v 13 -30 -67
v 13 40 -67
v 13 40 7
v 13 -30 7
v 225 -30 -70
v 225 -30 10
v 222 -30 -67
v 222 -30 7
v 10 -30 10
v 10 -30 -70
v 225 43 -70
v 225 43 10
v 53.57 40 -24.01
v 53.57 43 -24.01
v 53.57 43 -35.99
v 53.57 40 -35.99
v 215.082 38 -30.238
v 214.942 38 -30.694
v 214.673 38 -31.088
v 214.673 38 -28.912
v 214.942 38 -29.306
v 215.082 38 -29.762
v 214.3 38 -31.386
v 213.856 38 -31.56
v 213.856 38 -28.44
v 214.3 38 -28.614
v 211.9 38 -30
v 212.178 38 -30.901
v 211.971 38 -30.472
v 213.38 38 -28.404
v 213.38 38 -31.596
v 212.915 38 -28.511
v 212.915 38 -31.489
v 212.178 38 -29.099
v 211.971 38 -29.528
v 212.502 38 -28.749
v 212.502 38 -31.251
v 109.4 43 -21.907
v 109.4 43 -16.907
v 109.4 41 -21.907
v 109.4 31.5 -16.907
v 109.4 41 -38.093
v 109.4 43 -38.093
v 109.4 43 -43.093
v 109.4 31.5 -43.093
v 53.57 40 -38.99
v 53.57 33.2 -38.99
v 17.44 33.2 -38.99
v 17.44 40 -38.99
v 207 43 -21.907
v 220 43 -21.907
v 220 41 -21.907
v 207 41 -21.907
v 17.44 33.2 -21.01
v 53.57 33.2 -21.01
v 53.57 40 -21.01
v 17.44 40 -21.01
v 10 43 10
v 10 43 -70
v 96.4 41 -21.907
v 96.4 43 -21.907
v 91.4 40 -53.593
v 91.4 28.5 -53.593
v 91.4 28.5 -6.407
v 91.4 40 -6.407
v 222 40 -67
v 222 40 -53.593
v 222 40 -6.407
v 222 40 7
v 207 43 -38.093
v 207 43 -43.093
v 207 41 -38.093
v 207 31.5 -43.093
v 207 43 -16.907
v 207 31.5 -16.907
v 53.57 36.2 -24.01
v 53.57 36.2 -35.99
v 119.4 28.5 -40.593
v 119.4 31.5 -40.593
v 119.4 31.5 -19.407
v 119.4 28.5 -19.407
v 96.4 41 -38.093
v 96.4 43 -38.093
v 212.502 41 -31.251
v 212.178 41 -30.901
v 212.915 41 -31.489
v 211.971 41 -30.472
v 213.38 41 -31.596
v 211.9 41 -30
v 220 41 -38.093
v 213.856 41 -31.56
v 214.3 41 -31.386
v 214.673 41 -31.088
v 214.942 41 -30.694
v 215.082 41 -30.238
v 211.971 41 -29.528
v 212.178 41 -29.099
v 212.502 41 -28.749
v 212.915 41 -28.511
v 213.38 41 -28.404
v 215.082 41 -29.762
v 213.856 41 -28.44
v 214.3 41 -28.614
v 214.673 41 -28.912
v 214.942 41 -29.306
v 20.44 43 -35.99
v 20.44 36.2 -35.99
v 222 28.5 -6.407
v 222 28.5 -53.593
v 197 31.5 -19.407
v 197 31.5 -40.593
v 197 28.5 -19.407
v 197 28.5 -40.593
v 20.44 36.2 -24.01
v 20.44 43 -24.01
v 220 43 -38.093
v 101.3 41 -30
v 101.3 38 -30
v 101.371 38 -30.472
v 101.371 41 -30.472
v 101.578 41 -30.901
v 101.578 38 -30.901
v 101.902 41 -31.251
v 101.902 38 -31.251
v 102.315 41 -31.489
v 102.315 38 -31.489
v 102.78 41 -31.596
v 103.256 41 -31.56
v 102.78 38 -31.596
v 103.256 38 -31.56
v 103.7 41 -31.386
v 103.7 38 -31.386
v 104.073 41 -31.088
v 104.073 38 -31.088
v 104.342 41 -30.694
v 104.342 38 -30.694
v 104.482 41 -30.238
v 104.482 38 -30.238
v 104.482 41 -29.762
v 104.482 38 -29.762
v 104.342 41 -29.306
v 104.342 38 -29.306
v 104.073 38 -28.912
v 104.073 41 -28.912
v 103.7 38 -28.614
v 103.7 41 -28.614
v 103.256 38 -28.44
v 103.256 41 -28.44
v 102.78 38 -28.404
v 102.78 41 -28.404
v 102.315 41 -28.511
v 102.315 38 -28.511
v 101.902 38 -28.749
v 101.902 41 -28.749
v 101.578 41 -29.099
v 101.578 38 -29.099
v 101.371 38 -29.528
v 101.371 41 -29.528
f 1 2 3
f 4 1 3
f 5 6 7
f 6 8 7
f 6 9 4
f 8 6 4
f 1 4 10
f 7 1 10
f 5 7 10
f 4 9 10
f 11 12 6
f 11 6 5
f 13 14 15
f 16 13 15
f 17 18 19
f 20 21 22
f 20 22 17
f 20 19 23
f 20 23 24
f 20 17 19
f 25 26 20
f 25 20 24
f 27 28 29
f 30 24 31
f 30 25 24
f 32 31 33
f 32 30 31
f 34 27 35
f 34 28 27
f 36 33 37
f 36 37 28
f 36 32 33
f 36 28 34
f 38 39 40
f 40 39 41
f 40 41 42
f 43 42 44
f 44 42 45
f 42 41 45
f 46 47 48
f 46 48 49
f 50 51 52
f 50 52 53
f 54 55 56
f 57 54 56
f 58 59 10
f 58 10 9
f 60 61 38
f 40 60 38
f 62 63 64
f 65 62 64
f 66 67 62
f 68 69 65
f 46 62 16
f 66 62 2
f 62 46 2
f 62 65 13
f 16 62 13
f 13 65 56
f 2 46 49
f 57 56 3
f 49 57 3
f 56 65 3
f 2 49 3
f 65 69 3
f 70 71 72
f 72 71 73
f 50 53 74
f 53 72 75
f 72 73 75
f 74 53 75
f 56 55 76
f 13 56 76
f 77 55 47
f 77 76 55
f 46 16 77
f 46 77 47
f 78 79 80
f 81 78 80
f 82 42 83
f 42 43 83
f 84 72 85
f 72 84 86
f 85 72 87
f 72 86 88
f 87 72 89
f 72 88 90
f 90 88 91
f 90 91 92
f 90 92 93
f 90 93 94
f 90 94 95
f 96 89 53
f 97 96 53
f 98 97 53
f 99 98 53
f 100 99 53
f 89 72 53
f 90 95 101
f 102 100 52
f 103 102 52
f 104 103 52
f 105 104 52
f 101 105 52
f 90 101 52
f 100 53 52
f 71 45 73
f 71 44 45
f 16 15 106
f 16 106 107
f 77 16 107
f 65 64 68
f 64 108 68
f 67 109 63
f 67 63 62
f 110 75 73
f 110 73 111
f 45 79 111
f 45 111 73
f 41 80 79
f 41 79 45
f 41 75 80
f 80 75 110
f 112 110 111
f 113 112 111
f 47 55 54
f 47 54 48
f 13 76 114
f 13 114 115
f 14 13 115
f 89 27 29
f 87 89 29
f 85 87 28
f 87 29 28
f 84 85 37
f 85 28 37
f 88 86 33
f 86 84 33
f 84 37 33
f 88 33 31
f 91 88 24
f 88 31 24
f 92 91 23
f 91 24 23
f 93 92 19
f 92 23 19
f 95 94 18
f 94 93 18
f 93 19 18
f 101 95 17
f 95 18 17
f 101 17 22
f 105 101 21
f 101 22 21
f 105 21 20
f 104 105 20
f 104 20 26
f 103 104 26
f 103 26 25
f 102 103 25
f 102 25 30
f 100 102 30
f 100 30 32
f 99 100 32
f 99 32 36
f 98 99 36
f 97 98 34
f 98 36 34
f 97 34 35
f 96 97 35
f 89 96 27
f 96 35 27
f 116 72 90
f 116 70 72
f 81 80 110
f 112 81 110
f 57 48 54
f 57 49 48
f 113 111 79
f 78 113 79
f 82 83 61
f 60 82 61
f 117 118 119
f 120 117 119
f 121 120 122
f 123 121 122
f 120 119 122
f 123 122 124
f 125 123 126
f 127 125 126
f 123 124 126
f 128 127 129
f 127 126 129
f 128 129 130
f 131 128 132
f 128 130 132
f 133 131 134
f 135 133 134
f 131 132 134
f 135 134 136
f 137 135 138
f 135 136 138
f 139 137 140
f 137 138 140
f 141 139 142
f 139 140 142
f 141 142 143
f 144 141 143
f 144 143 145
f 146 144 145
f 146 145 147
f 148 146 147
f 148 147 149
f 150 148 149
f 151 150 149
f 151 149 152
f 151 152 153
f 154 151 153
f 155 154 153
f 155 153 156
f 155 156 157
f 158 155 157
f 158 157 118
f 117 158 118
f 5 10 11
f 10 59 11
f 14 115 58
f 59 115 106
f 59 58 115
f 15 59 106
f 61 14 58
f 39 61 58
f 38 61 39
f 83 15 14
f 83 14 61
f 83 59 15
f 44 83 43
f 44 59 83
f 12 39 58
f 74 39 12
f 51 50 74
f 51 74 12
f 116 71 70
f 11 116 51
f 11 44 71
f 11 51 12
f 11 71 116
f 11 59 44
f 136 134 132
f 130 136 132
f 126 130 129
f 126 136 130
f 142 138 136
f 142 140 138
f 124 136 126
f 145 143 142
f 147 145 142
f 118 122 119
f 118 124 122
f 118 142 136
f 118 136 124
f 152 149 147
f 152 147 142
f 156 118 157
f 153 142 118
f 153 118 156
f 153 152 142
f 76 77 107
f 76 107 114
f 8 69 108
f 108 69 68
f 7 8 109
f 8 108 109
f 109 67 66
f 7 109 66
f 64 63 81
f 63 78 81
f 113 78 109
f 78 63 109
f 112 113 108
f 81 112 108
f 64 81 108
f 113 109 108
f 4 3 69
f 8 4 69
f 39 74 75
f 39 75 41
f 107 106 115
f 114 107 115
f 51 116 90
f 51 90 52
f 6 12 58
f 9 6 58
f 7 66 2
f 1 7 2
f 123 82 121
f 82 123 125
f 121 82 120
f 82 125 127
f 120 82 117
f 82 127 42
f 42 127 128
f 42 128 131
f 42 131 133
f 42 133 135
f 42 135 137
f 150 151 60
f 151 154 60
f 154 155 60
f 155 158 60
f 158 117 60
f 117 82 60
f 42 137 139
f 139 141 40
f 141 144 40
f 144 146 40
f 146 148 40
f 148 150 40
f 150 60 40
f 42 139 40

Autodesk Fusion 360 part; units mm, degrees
sketch "Boceto1" plane through (0, 0, 0) normal (0, 1, 0) x (1, 0, 0)
  line L0 (0, 0) -> (220, 0)
  line L1 (220, 0) -> (220, 60)
  line L2 (220, 60) -> (0, 60)
  line L3 (0, 60) -> (0, 0)
  line L4 (227, -7) -> (227, 67)
  line L5 (227, 67) -> (-7, 67)
  line L6 (-7, 67) -> (-7, -7)
  line L7 (-7, -7) -> (227, -7)
  line L8 (217, 3) -> (217, 57)
  line L9 (217, 57) -> (3, 57)
  line L10 (3, 57) -> (3, 3)
  line L11 (3, 3) -> (217, 3)
  dimension "d1" = 220
  dimension "d2" = 60
  dimension "d3" = 7
  dimension "d4" = -3
extrude "Extruir1" add sketch "Boceto1" along normal blind 3 contours L4 L5 L6 L7
sketch "Boceto2" plane through (0, 0, 0) normal (0, 1, 0) x (1, 0, 0)
  line L0 (0, 0) -> (220, 0)
  line L1 (220, 0) -> (220, 60)
  line L2 (220, 60) -> (0, 60)
  line L3 (0, 60) -> (0, 0)
  line L4 (3, 3) -> (217, 3)
  line L5 (217, 3) -> (217, 57)
  line L6 (217, 57) -> (3, 57)
  line L7 (3, 57) -> (3, 3)
  dimension "d7" = -3
extrude "Extruir2" add sketch "Boceto2" along normal blind 40
sketch "Boceto3" plane through (0, 40, 0) normal (0, 1, 0) x (-1, 0, 0)
  line L0 (-3, -3) -> (-3, -57)
  line L1 (-3, -57) -> (-217, -57)
  line L2 (-217, -57) -> (-217, -3)
  line L3 (-217, -3) -> (-3, -3)
  line L4 (0, -60) -> (0, 0)
  line L5 (0, 0) -> (-220, 0)
  line L6 (-220, 0) -> (-220, -60)
  line L7 (-220, -60) -> (0, -60)
  line L8 (0, 0) -> (-220, 0)
  line L9 (-220, 0) -> (-220, -60)
  line L10 (-220, -60) -> (0, -60)
  line L11 (0, -60) -> (0, 0)
  line L12 (0, 0) -> (-220, 0)
  line L13 (-220, 0) -> (-220, -60)
  line L14 (-220, -60) -> (0, -60)
  line L15 (0, -60) -> (0, 0)
extrude "Extruir3" add sketch "Boceto3" along normal blind 3 contours L0 L1 L2 L3 | L4 L5 L6 L7 L8 L9 L10 L11 L12 L13 L14 L15
sketch "Boceto4" plane through (0, 43, 0) normal (0, 1, 0) x (-1, 0, 0)
  line L0 (0, -60) -> (0, 0)
  line L1 (0, 0) -> (-220, 0)
  line L2 (-220, 0) -> (-220, -60)
  line L3 (-220, -60) -> (0, -60)
  line L4 (-25, -35.99) -> (-53.57, -35.99)
  line L5 (-53.57, -35.99) -> (-53.57, -24.01)
  line L6 (-53.57, -24.01) -> (-25, -24.01)
  line L7 (-25, -24.01) -> (-25, -35.99)
  dimension "d15" = 28.57
  dimension "d16" = 11.98
extrude "Extruir4" cut sketch "Boceto4" against normal blind 3 contours L4 L5 L6 L7
sketch "Boceto5" plane through (0, 43, 0) normal (0, 1, 0) x (-1, 0, 0)
  line L0 (-53.57, -35.99) -> (-53.57, -24.01)
  line L1 (-53.57, -24.01) -> (-25, -24.01)
  line L2 (-25, -24.01) -> (-25, -35.99)
  line L3 (-25, -35.99) -> (-53.57, -35.99)
  line L4 (0, -60) -> (0, 0)
  line L5 (0, 0) -> (-220, 0)
  line L6 (-220, 0) -> (-220, -60)
  line L7 (-220, -60) -> (0, -60)
  line L8 (-197, -40.593) -> (-119.4, -40.593)
  line L9 (-119.4, -40.593) -> (-119.4, -19.407)
  line L10 (-119.4, -19.407) -> (-197, -19.407)
  line L11 (-197, -19.407) -> (-197, -40.593)
  point P0 (-220, -30)
  point P1 (-197, -40.593)
  dimension "d22" = 77.6
  dimension "d23" = 21.186
extrude "Extruir5" cut sketch "Boceto5" against normal blind 3 contours L8 L9 L10 L11
sketch "Boceto6" plane through (0, 40, 0) normal (0, -1, 0) x (1, 0, 0)
  line L0 (197, -40.593) -> (119.4, -40.593)
  line L1 (119.4, -40.593) -> (119.4, -19.407)
  line L2 (119.4, -19.407) -> (197, -19.407)
  line L3 (197, -19.407) -> (197, -40.593)
  line L4 (53.57, -24.01) -> (53.57, -35.99)
  line L5 (53.57, -35.99) -> (25, -35.99)
  line L6 (25, -35.99) -> (25, -24.01)
  line L7 (25, -24.01) -> (53.57, -24.01)
  line L8 (217, -3) -> (3, -3)
  line L9 (3, -3) -> (3, -57)
  line L10 (3, -57) -> (217, -57)
  line L11 (217, -57) -> (217, -3)
  line L12 (200, -43.593) -> (116.4, -43.593)
  line L13 (116.4, -43.593) -> (116.4, -16.407)
  line L14 (116.4, -16.407) -> (200, -16.407)
  line L15 (200, -16.407) -> (200, -43.593)
  dimension "d26" = -3
extrude "Extruir6" add sketch "Boceto6" along normal blind 11.5 contours L12 L13 L14 L15
sketch "Boceto7" plane through (0, 43, 0) normal (0, 1, 0) x (-1, 0, 0)
  line L0 (-119.4, -40.593) -> (-197, -40.593)
  line L1 (-197, -40.593) -> (-197, -19.407)
  line L2 (-197, -19.407) -> (-119.4, -19.407)
  line L3 (-119.4, -19.407) -> (-119.4, -40.593)
  line L4 (-53.57, -35.99) -> (-53.57, -24.01)
  line L5 (-53.57, -24.01) -> (-25, -24.01)
  line L6 (-25, -24.01) -> (-25, -35.99)
  line L7 (-25, -35.99) -> (-53.57, -35.99)
  line L8 (0, -60) -> (0, 0)
  line L9 (0, 0) -> (-220, 0)
  line L10 (-220, 0) -> (-220, -60)
  line L11 (-220, -60) -> (0, -60)
  line L12 (0, 0) -> (-220, 0)
  line L13 (-220, 0) -> (-220, -60)
  line L14 (-220, -60) -> (0, -60)
  line L15 (0, -60) -> (0, 0)
  line L16 (-230, -70) -> (10, -70)
  line L17 (10, -70) -> (10, 10)
  line L18 (10, 10) -> (-230, 10)
  line L19 (-230, 10) -> (-230, -70)
  dimension "d29" = 10
extrude "Extruir7" add sketch "Boceto7" against normal blind 43 contours L16 L17 L18 L19
sketch "Boceto8" plane through (0, 43, 0) normal (0, 1, 0) x (-1, 0, 0)
  line L0 (-230, 10) -> (-230, -70)
  line L1 (-230, -70) -> (10, -70)
  line L2 (10, -70) -> (10, 10)
  line L3 (10, 10) -> (-230, 10)
  line L4 (-119.4, -40.593) -> (-197, -40.593)
  line L5 (-197, -40.593) -> (-197, -19.407)
  line L6 (-197, -19.407) -> (-119.4, -19.407)
  line L7 (-119.4, -19.407) -> (-119.4, -40.593)
  line L8 (-53.57, -35.99) -> (-53.57, -24.01)
  line L9 (-53.57, -24.01) -> (-25, -24.01)
  line L10 (-25, -24.01) -> (-25, -35.99)
  line L11 (-25, -35.99) -> (-53.57, -35.99)
sketch "Boceto9" plane through (0, 0, 0) normal (0, -1, 0) x (1, 0, 0)
  line L0 (230, -70) -> (230, 10)
  line L1 (230, 10) -> (-10, 10)
  line L2 (-10, 10) -> (-10, -70)
  line L3 (-10, -70) -> (230, -70)
  line L4 (3, -57) -> (3, -3)
  line L5 (3, -3) -> (217, -3)
  line L6 (217, -3) -> (217, -57)
  line L7 (217, -57) -> (3, -57)
  line L8 (-10, 10) -> (-7, 10)
  line L9 (-7, 10) -> (-7, 7)
  line L10 (-7, 7) -> (-10, 7)
  line L11 (-10, 7) -> (-10, 10)
  line L12 (230, -70) -> (227, -70)
  line L13 (227, -70) -> (227, -67)
  line L14 (227, -67) -> (230, -67)
  line L15 (230, -67) -> (230, -70)
  line L16 (-7, 7) -> (227, 7)
  line L17 (227, 7) -> (227, -67)
  line L18 (227, -67) -> (-7, -67)
  line L19 (-7, -67) -> (-7, 7)
  dimension "d32" = 3
  dimension "d33" = 3
  dimension "d34" = 3
  dimension "d35" = 3
extrude "Extruir8" cut sketch "Boceto9" against normal blind 40 contours L16 L17 L18 L19
sketch "Boceto10" plane through (0, 40, 0) normal (0, -1, 0) x (1, 0, 0)
  line L0 (-7, -67) -> (227, -67)
  line L1 (227, -67) -> (227, 7)
  line L2 (227, 7) -> (-7, 7)
  line L3 (-7, 7) -> (-7, -67)
  line L4 (200, -16.407) -> (200, -43.593)
  line L5 (200, -43.593) -> (116.4, -43.593)
  line L6 (116.4, -43.593) -> (116.4, -16.407)
  line L7 (116.4, -16.407) -> (200, -16.407)
  line L8 (53.57, -24.01) -> (53.57, -35.99)
  line L9 (53.57, -35.99) -> (25, -35.99)
  line L10 (25, -35.99) -> (25, -24.01)
  line L11 (25, -24.01) -> (53.57, -24.01)
  line L12 (56.57, -38.99) -> (22, -38.99)
  line L13 (22, -38.99) -> (22, -21.01)
  line L14 (22, -21.01) -> (56.57, -21.01)
  line L15 (56.57, -21.01) -> (56.57, -38.99)
  dimension "d38" = -3
extrude "Extruir9" add sketch "Boceto10" along normal blind 3.8 contours L12 L13 L14 L15
sketch "Boceto11" plane through (0, 36.2, 0) normal (0, -1, 0) x (1, 0, 0)
  line L0 (25, -35.99) -> (25, -24.01)
  line L1 (25, -24.01) -> (53.57, -24.01)
  line L2 (53.57, -24.01) -> (53.57, -35.99)
  line L3 (53.57, -35.99) -> (25, -35.99)
  line L4 (56.57, -21.01) -> (22, -21.01)
  line L5 (22, -21.01) -> (22, -38.99)
  line L6 (22, -38.99) -> (56.57, -38.99)
  line L7 (56.57, -38.99) -> (56.57, -21.01)
  line L8 (22, -21.01) -> (56.57, -21.01)
  line L9 (56.57, -21.01) -> (56.57, -38.99)
  line L10 (56.57, -38.99) -> (22, -38.99)
  line L11 (22, -38.99) -> (22, -21.01)
extrude "Extruir10" add sketch "Boceto11" along normal blind 3 contours L0 L1 L2 L3 | L4 L5 L6 L7 L8 L9 L10 L11
sketch "Boceto12" plane through (56.57, 0, 0) normal (1, 0, 0) x (0, 0, -1)
  line L0 (38.99, 40) -> (21.01, 40)
  line L1 (21.01, 40) -> (21.01, 33.2)
  line L2 (21.01, 33.2) -> (38.99, 33.2)
  line L3 (38.99, 33.2) -> (38.99, 40)
  line L4 (21.01, 40) -> (24.01, 40)
  line L5 (38.99, 40) -> (35.99, 40)
  line L6 (24.01, 40) -> (35.99, 40)
  line L7 (35.99, 40) -> (35.99, 36.2)
  line L8 (35.99, 36.2) -> (24.01, 36.2)
  line L9 (24.01, 36.2) -> (24.01, 40)
  dimension "d43" = 3
  dimension "d44" = 3
  dimension "d45" = 11.98
  dimension "d46" = 3.8
extrude "Extruir11" cut sketch "Boceto12" against normal blind 3 contours L0 L6 L7 L8 L9
sketch "Boceto13" plane through (56.57, 0, 0) normal (1, 0, 0) x (0, 0, -1)
  line L0 (24.01, 36.2) -> (24.01, 40)
  line L1 (24.01, 40) -> (21.01, 40)
  line L2 (21.01, 40) -> (21.01, 33.2)
  line L3 (21.01, 33.2) -> (38.99, 33.2)
  line L4 (38.99, 33.2) -> (38.99, 40)
  line L5 (38.99, 40) -> (35.99, 40)
  line L6 (35.99, 40) -> (35.99, 36.2)
  line L7 (35.99, 36.2) -> (24.01, 36.2)
  line L8 (21.01, 40) -> (38.99, 40)
  line L9 (38.99, 40) -> (38.99, 33.2)
  line L10 (38.99, 33.2) -> (21.01, 33.2)
  line L11 (21.01, 33.2) -> (21.01, 40)
extrude "Extruir12" cut sketch "Boceto13" against normal blind 3 contours L0 L1 L2 L3 L4 L5 L6 L7 L8 L9 L10 L11
sketch "Boceto14" plane through (25, 0, 0) normal (1, 0, 0) x (0, 0, -1)
  line L0 (35.99, 43) -> (24.01, 43)
  line L1 (24.01, 43) -> (24.01, 36.2)
  line L2 (24.01, 36.2) -> (35.99, 36.2)
  line L3 (35.99, 36.2) -> (35.99, 43)
  line L4 (24.01, 43) -> (35.99, 43)
  line L5 (35.99, 43) -> (35.99, 36.2)
  line L6 (35.99, 36.2) -> (24.01, 36.2)
  line L7 (24.01, 36.2) -> (24.01, 43)
extrude "Extruir13" add sketch "Boceto14" against normal blind 4.56
extrude "Extruir14" add 1 faces at (22, 34.2, -28.0033) along direction (-1, 0, 0) blind 4.56
extrude "Extruir15" cut 1 faces at (25, 40.7333, -31.9967) along direction (-1, 0, 0) blind 4.56
sketch "Boceto15" plane through (17.44, 0, 0) normal (-1, 0, 0) x (0, 0, 1)
  line L0 (-35.99, 36.2) -> (-35.99, 40)
  line L1 (-35.99, 40) -> (-38.99, 40)
  line L2 (-38.99, 40) -> (-38.99, 33.2)
  line L3 (-38.99, 33.2) -> (-21.01, 33.2)
  line L4 (-21.01, 33.2) -> (-21.01, 40)
  line L5 (-21.01, 40) -> (-24.01, 40)
  line L6 (-24.01, 40) -> (-24.01, 36.2)
  line L7 (-24.01, 36.2) -> (-35.99, 36.2)
  line L8 (-38.99, 33.2) -> (-21.01, 33.2)
  line L9 (-21.01, 33.2) -> (-21.01, 40)
  line L10 (-21.01, 40) -> (-38.99, 40)
  line L11 (-38.99, 40) -> (-38.99, 33.2)
extrude "Extruir16" add sketch "Boceto15" against normal blind 3 contours L0 L6 L7 L10
sketch "Boceto16" plane through (0, 0, 0) normal (0, -1, 0) x (1, 0, 0)
  line L0 (227, 7) -> (227, -67)
  line L1 (227, -67) -> (-7, -67)
  line L2 (-7, -67) -> (-7, 7)
  line L3 (-7, 7) -> (227, 7)
  line L4 (230, -70) -> (230, 10)
  line L5 (230, 10) -> (-10, 10)
  line L6 (-10, 10) -> (-10, -70)
  line L7 (-10, -70) -> (230, -70)
  line L8 (230, 10) -> (245, 10)
  line L9 (245, 10) -> (245, -70)
  line L10 (245, -70) -> (230, -70)
  line L11 (230, -70) -> (230, 10)
  line L12 (-10, 10) -> (-25, 10)
  line L13 (-25, 10) -> (-25, -70)
  line L14 (-25, -70) -> (-10, -70)
  line L15 (-10, -70) -> (-10, 10)
  dimension "d59" = 15
  dimension "d60" = 80
  dimension "d61" = 15
  dimension "d62" = 80
extrude "Extruir17" add sketch "Boceto16" against normal blind 3 contours L4 L8 L9 L10 L11 | L6 L12 L13 L14 L15
sketch "Boceto17" plane through (0, 3, 0) normal (0, 1, 0) x (-1, 0, 0)
  line L0 (10, 10) -> (10, -70)
  line L1 (10, -70) -> (25, -70)
  line L2 (25, -70) -> (25, 10)
  line L3 (25, 10) -> (10, 10)
  circle A0 centre (17.5, 1.5623) radius 3.375
  circle A1 centre (16.8728, -62.4918) radius 3.375
  circle A2 centre (-237.4689, -62.1794) radius 3.375
  circle A3 centre (-237.1564, 2.4997) radius 3.375
  dimension "d65" = 6.75
  dimension "d66" = 6.75
  dimension "d67" = 6.75
  dimension "d68" = 6.75
extrude "Extruir18" cut sketch "Boceto17" against normal blind 3 contours A0 | A1 | A2 | A3
sketch "Boceto18" plane through (0, 0, 0) normal (0, -1, 0) x (1, 0, 0)
  line L0 (245, 10) -> (-25, 10)
  line L1 (-25, 10) -> (-25, -70)
  line L2 (-25, -70) -> (245, -70)
  line L3 (245, -70) -> (245, 10)
  line L4 (227, 7) -> (227, -67)
  line L5 (227, -67) -> (-7, -67)
  line L6 (-7, -67) -> (-7, 7)
  line L7 (-7, 7) -> (227, 7)
  circle A0 centre (237.4689, -62.1794) radius 3.375
  circle A1 centre (-16.8728, -62.4918) radius 3.375
  circle A2 centre (237.1564, 2.4997) radius 3.375
  circle A3 centre (-17.5, 1.5623) radius 3.375
  line L8 (-25, 10) -> (245, 10)
  line L9 (245, 10) -> (245, -70)
  line L10 (245, -70) -> (-25, -70)
  line L11 (-25, -70) -> (-25, 10)
extrude "Extruir19" add sketch "Boceto18" along normal blind 30
sketch "Boceto19" plane through (0, 3, 0) normal (0, 1, 0) x (-1, 0, 0)
  circle A0 centre (17.5, 1.5623) radius 3.375
  circle A1 centre (16.8728, -62.4918) radius 3.375
  line L0 (10, 10) -> (10, -70)
  line L1 (10, -70) -> (25, -70)
  line L2 (25, -70) -> (25, 10)
  line L3 (25, 10) -> (10, 10)
  line L4 (25, -70) -> (10, -70)
  line L5 (10, -70) -> (10, 10)
  line L6 (10, 10) -> (25, 10)
  line L7 (25, 10) -> (25, -70)
  line L8 (-230, -70) -> (-245, -70)
  line L9 (-245, -70) -> (-245, 10)
  line L10 (-245, 10) -> (-230, 10)
  line L11 (-230, 10) -> (-230, -70)
extrude "Extruir20" cut sketch "Boceto19" against normal blind 25
sketch "Boceto20" plane through (0, 43, 0) normal (0, 1, 0) x (-1, 0, 0)
  line L0 (-230, 10) -> (-230, -70)
  line L1 (-230, -70) -> (10, -70)
  line L2 (10, -70) -> (10, 10)
  line L3 (10, 10) -> (-230, 10)
  line L4 (-119.4, -40.593) -> (-197, -40.593)
  line L5 (-197, -40.593) -> (-197, -19.407)
  line L6 (-197, -19.407) -> (-119.4, -19.407)
  line L7 (-119.4, -19.407) -> (-119.4, -40.593)
  line L8 (-53.57, -24.01) -> (-20.44, -24.01)
  line L9 (-20.44, -24.01) -> (-20.44, -35.99)
  line L10 (-20.44, -35.99) -> (-53.57, -35.99)
  line L11 (-53.57, -35.99) -> (-53.57, -24.01)
  line L12 (-197, -19.407) -> (-119.4, -19.407)
  line L13 (-119.4, -19.407) -> (-119.4, -40.593)
  line L14 (-119.4, -40.593) -> (-197, -40.593)
  line L15 (-197, -40.593) -> (-197, -19.407)
  line L16 (-207, -50.593) -> (-207, -9.407)
  line L17 (-207, -9.407) -> (-109.4, -9.407)
  line L18 (-109.4, -9.407) -> (-109.4, -50.593)
  line L19 (-109.4, -50.593) -> (-207, -50.593)
  dimension "d75" = -10
extrude "Extruir21" add sketch "Boceto20" against normal blind 14.5 contours L16 L17 L18 L19
sketch "Boceto21" plane through (0, 28.5, 0) normal (0, -1, 0) x (1, 0, 0)
  line L0 (109.4, -9.407) -> (109.4, -50.593)
  line L1 (109.4, -50.593) -> (207, -50.593)
  line L2 (207, -50.593) -> (207, -9.407)
  line L3 (207, -9.407) -> (109.4, -9.407)
  line L4 (119.4, -19.407) -> (197, -19.407)
  line L5 (197, -19.407) -> (197, -40.593)
  line L6 (197, -40.593) -> (119.4, -40.593)
  line L7 (119.4, -40.593) -> (119.4, -19.407)
  line L8 (207, -50.593) -> (109.4, -50.593)
  line L9 (109.4, -50.593) -> (109.4, -9.407)
  line L10 (109.4, -9.407) -> (207, -9.407)
  line L11 (207, -9.407) -> (207, -50.593)
  line L12 (210, -6.407) -> (210, -53.593)
  line L13 (210, -53.593) -> (106.4, -53.593)
  line L14 (106.4, -53.593) -> (106.4, -6.407)
  line L15 (106.4, -6.407) -> (210, -6.407)
  dimension "d78" = -3
extrude "Extruir22" add sketch "Boceto21" against normal blind 11.5 contours L12 L13 L14 L15
sketch "Boceto22" plane through (0, 43, 0) normal (0, 1, 0) x (-1, 0, 0)
  line L0 (-119.4, -40.593) -> (-197, -40.593)
  line L1 (-197, -40.593) -> (-197, -19.407)
  line L2 (-197, -19.407) -> (-119.4, -19.407)
  line L3 (-119.4, -19.407) -> (-119.4, -40.593)
  line L4 (-230, 10) -> (-230, -70)
  line L5 (-230, -70) -> (10, -70)
  line L6 (10, -70) -> (10, 10)
  line L7 (10, 10) -> (-230, 10)
  line L8 (-53.57, -24.01) -> (-20.44, -24.01)
  line L9 (-20.44, -24.01) -> (-20.44, -35.99)
  line L10 (-20.44, -35.99) -> (-53.57, -35.99)
  line L11 (-53.57, -35.99) -> (-53.57, -24.01)
  line L12 (-197, -19.407) -> (-119.4, -19.407)
  line L13 (-119.4, -19.407) -> (-119.4, -40.593)
  line L14 (-119.4, -40.593) -> (-197, -40.593)
  line L15 (-197, -40.593) -> (-197, -19.407)
  line L16 (-207, -50.593) -> (-207, -9.407)
  line L17 (-207, -9.407) -> (-109.4, -9.407)
  line L18 (-109.4, -9.407) -> (-109.4, -50.593)
  line L19 (-109.4, -50.593) -> (-207, -50.593)
  dimension "d81" = -10
extrude "Extruir23" cut sketch "Boceto22" against normal blind 11.5 contours L16 L17 L18 L19
extrude "Extruir24" add 1 faces at (174.4667, 39.1667, -9.407) along direction (0, 0, -1) blind 7.5
extrude "Extruir25" add 1 faces at (141.9333, 39.1667, -50.593) along direction (0, 0, 1) blind 7.5
extrude "Extruir26" add 1 faces at (106.4, 32.3333, -37.8643) along direction (-1, 0, 0) blind 10
extrude "Extruir27" add 1 faces at (210, 32.3333, -22.1357) along direction (1, 0, 0) blind 17
sketch "Boceto23" plane through (0, 28.5, 0) normal (0, -1, 0) x (1, 0, 0)
  line L0 (96.4, -53.593) -> (227, -53.593)
  line L1 (227, -53.593) -> (227, -6.407)
  line L2 (227, -6.407) -> (96.4, -6.407)
  line L3 (96.4, -6.407) -> (96.4, -53.593)
  line L4 (119.4, -19.407) -> (197, -19.407)
  line L5 (197, -19.407) -> (197, -40.593)
  line L6 (197, -40.593) -> (119.4, -40.593)
  line L7 (119.4, -40.593) -> (119.4, -19.407)
  line L8 (96.4, -29.997) -> (227, -30)
  circle A0 centre (101.1931, -29.997) radius 3.375
  circle A1 centre (214.3398, -29.9985) radius 3.375
  dimension "d93" = 6.75
  dimension "d94" = 6.75
extrude "Extruir28" cut sketch "Boceto23" against normal blind 14.5 contours L8 A0 | L8 A0 | L8 A1 | L8 A1
sketch "Boceto24" plane through (0, 43, 0) normal (0, 1, 0) x (-1, 0, 0)
  circle A0 centre (-214.3398, -29.9985) radius 3.375
  circle A1 centre (-101.1931, -29.997) radius 3.375
  line L0 (-109.4, -16.907) -> (-109.4, -43.093)
  line L1 (-109.4, -43.093) -> (-207, -43.093)
  line L2 (-207, -43.093) -> (-207, -16.907)
  line L3 (-207, -16.907) -> (-109.4, -16.907)
  line L4 (-230, 10) -> (-230, -70)
  line L5 (-230, -70) -> (10, -70)
  line L6 (10, -70) -> (10, 10)
  line L7 (10, 10) -> (-230, 10)
  line L8 (-53.57, -24.01) -> (-20.44, -24.01)
  line L9 (-20.44, -24.01) -> (-20.44, -35.99)
  line L10 (-20.44, -35.99) -> (-53.57, -35.99)
  line L11 (-53.57, -35.99) -> (-53.57, -24.01)
  line L12 (-207, -16.907) -> (-207, -22.407)
  line L13 (-207, -22.407) -> (-220.2736, -22.407)
  line L14 (-220.2736, -22.407) -> (-220.2736, -37.593)
  line L15 (-220.2736, -37.593) -> (-207, -37.593)
  line L16 (-207, -37.593) -> (-207, -22.407)
  dimension "d98" = 5.5
  dimension "d99" = 15.186
extrude "Extruir29" cut sketch "Boceto24" against normal blind 3 contours L2 L13 L14 L15 L16
sketch "Boceto25" plane through (0, 43, 0) normal (0, 1, 0) x (-1, 0, 0)
  line L0 (-220.2736, -22.407) -> (-207, -22.407)
  line L1 (-207, -22.407) -> (-207, -16.907)
  line L2 (-207, -16.907) -> (-109.4, -16.907)
  line L3 (-109.4, -16.907) -> (-109.4, -43.093)
  line L4 (-109.4, -43.093) -> (-207, -43.093)
  line L5 (-207, -43.093) -> (-207, -37.593)
  line L6 (-207, -37.593) -> (-220.2736, -37.593)
  line L7 (-220.2736, -37.593) -> (-220.2736, -22.407)
  circle A0 centre (-101.1931, -29.997) radius 3.375
  line L8 (-230, 10) -> (-230, -70)
  line L9 (-230, -70) -> (10, -70)
  line L10 (10, -70) -> (10, 10)
  line L11 (10, 10) -> (-230, 10)
  line L12 (-53.57, -24.01) -> (-20.44, -24.01)
  line L13 (-20.44, -24.01) -> (-20.44, -35.99)
  line L14 (-20.44, -35.99) -> (-53.57, -35.99)
  line L15 (-53.57, -35.99) -> (-53.57, -24.01)
  line L16 (-207, -22.407) -> (-85.5036, -22.407)
  line L17 (-109.4, -22.407) -> (-96.126, -22.407)
  line L18 (-96.126, -22.407) -> (-96.126, -37.593)
  line L19 (-96.126, -37.593) -> (-109.4, -37.593)
  line L20 (-109.4, -37.593) -> (-109.4, -22.407)
  dimension "d102" = 13.274
  dimension "d103" = 15.186
extrude "Extruir30" cut sketch "Boceto25" against normal blind 3 contours L3 L16 L17 L18 L19 L20
extrude "Extruir31" add 1 faces at (96.4, 32.3333, -32.531) along direction (-1, 0, 0) blind 5
extrude "Extruir32" cut 1 faces at (96.126, 42, -27.469) along direction (-1, 0, 0) blind 1
sketch "Boceto26" plane through (0, 28.5, 0) normal (0, -1, 0) x (1, 0, 0)
  circle A0 centre (214.3398, -29.9985) radius 3.375
  circle A1 centre (101.1931, -29.997) radius 3.375
  line L0 (91.4, -53.593) -> (227, -53.593)
  line L1 (227, -53.593) -> (227, -6.407)
  line L2 (227, -6.407) -> (91.4, -6.407)
  line L3 (91.4, -6.407) -> (91.4, -53.593)
  line L4 (119.4, -19.407) -> (197, -19.407)
  line L5 (197, -19.407) -> (197, -40.593)
  line L6 (197, -40.593) -> (119.4, -40.593)
  line L7 (119.4, -40.593) -> (119.4, -19.407)
  line L8 (96.7391, -25.3343) -> (105, -25.3343)
  line L9 (105, -25.3343) -> (105, -35)
  line L10 (105, -35) -> (96.7391, -35)
  line L11 (96.7391, -35) -> (96.7391, -25.3343)
  line L12 (210.0534, -25.3343) -> (218.8583, -25.3343)
  line L13 (218.8583, -25.3343) -> (218.8583, -33.797)
  line L14 (218.8583, -33.797) -> (210.0534, -33.797)
  line L15 (210.0534, -33.797) -> (210.0534, -25.3343)
extrude "Extruir33" add sketch "Boceto26" against normal blind 7 contours A0 | A1 | L8 L9 L10 L11 | L12 L13 L14 L15
sketch "Boceto27" plane through (0, 43, 0) normal (0, 1, 0) x (-1, 0, 0)
  line L0 (-95.126, -37.593) -> (-109.4, -37.593)
  line L1 (-109.4, -37.593) -> (-109.4, -43.093)
  line L2 (-109.4, -43.093) -> (-207, -43.093)
  line L3 (-207, -43.093) -> (-207, -37.593)
  line L4 (-207, -37.593) -> (-220.2736, -37.593)
  line L5 (-220.2736, -37.593) -> (-220.2736, -22.407)
  line L6 (-220.2736, -22.407) -> (-207, -22.407)
  line L7 (-207, -22.407) -> (-207, -16.907)
  line L8 (-207, -16.907) -> (-109.4, -16.907)
  line L9 (-109.4, -16.907) -> (-109.4, -22.407)
  line L10 (-109.4, -22.407) -> (-95.126, -22.407)
  line L11 (-95.126, -22.407) -> (-95.126, -37.593)
  line L12 (-230, 10) -> (-230, -70)
  line L13 (-230, -70) -> (10, -70)
  line L14 (10, -70) -> (10, 10)
  line L15 (10, 10) -> (-230, 10)
  line L16 (-53.57, -24.01) -> (-20.44, -24.01)
  line L17 (-20.44, -24.01) -> (-20.44, -35.99)
  line L18 (-20.44, -35.99) -> (-53.57, -35.99)
  line L19 (-53.57, -35.99) -> (-53.57, -24.01)
  line L20 (-95.126, -37.593) -> (-109.4, -37.593)
  line L21 (-109.4, -37.593) -> (-109.4, -22.407)
  line L22 (-109.4, -22.407) -> (-95.126, -22.407)
  line L23 (-95.126, -22.407) -> (-95.126, -37.593)
  line L24 (-220.2736, -37.593) -> (-207, -37.593)
  line L25 (-207, -37.593) -> (-207, -22.407)
  line L26 (-207, -22.407) -> (-220.2736, -22.407)
  line L27 (-220.2736, -22.407) -> (-220.2736, -37.593)
  point P0 (-95.126, -37.593)
  point P1 (-109.4, -22.407)
  point P2 (-220.2736, -37.593)
  point P3 (-207, -22.407)
extrude "Extruir34" add sketch "Boceto27" against normal blind 3 contours L0 L10 L11 L20 L21 L22 L23 | L4 L5 L6 L24 L25 L26 L27
sketch "Boceto28" plane through (0, 43, 0) normal (0, 1, 0) x (-1, 0, 0)
  line L0 (-109.4, -16.907) -> (-109.4, -43.093)
  line L1 (-109.4, -43.093) -> (-207, -43.093)
  line L2 (-207, -43.093) -> (-207, -16.907)
  line L3 (-207, -16.907) -> (-109.4, -16.907)
  line L4 (-230, 10) -> (-230, -70)
  line L5 (-230, -70) -> (10, -70)
  line L6 (10, -70) -> (10, 10)
  line L7 (10, 10) -> (-230, 10)
  line L8 (-53.57, -24.01) -> (-20.44, -24.01)
  line L9 (-20.44, -24.01) -> (-20.44, -35.99)
  line L10 (-20.44, -35.99) -> (-53.57, -35.99)
  line L11 (-53.57, -35.99) -> (-53.57, -24.01)
  line L12 (-109.4, -43.093) -> (-109.4, -38.093)
  line L13 (-109.4, -38.093) -> (-96.4, -38.093)
  line L14 (-96.4, -38.093) -> (-96.4, -21.907)
  line L15 (-96.4, -21.907) -> (-109.4, -21.907)
  line L16 (-109.4, -21.907) -> (-109.4, -38.093)
  line L17 (-207, -43.093) -> (-207, -38.093)
  line L18 (-207, -38.093) -> (-220, -38.093)
  line L19 (-220, -38.093) -> (-220, -21.907)
  line L20 (-220, -21.907) -> (-207, -21.907)
  line L21 (-207, -21.907) -> (-207, -38.093)
  dimension "d114" = 5
  dimension "d115" = 13
  dimension "d116" = 16.186
  dimension "d117" = 5
  dimension "d118" = 13
  dimension "d119" = 16.186
extrude "Extruir35" cut sketch "Boceto28" against normal blind 5 contours L0 L13 L14 L15 L16 | L2 L18 L19 L20 L21
sketch "Boceto29" plane through (0, 38, 0) normal (0, 1, 0) x (-1, 0, 0)
  circle A0 centre (-101.1931, -29.997) radius 3.375
  line L0 (-109.4, -21.907) -> (-109.4, -38.093)
  line L1 (-109.4, -38.093) -> (-96.4, -38.093)
  line L2 (-96.4, -38.093) -> (-96.4, -21.907)
  line L3 (-96.4, -21.907) -> (-109.4, -21.907)
  line L4 (-109.4, -38.093) -> (-96.4, -38.093)
  line L5 (-96.4, -38.093) -> (-96.4, -21.907)
  line L6 (-96.4, -21.907) -> (-109.4, -21.907)
  line L7 (-109.4, -21.907) -> (-109.4, -38.093)
extrude "Extruir36" add 1 faces at (101.7722, 35.5, -28.9498) along direction (0, 1, 0) blind 2.5
extrude "Extruir37" add 1 faces at (212.977, 35.5, -30.9276) along direction (0, 1, 0) blind 2.5
sketch "Boceto30" plane through (0, 38, 0) normal (0, 1, 0) x (-1, 0, 0)
  line L0 (-109.4, -21.907) -> (-109.4, -38.093)
  line L1 (-109.4, -38.093) -> (-96.4, -38.093)
  line L2 (-96.4, -38.093) -> (-96.4, -21.907)
  line L3 (-96.4, -21.907) -> (-109.4, -21.907)
  line L4 (-109.4, -38.093) -> (-109.4, -30)
  line L5 (-109.4, -30) -> (-102.9, -30)
  circle A0 centre (-102.9, -30) radius 1.6
  dimension "d126" = 8.093
  dimension "d127" = 6.5
  dimension "d128" = 3.2
extrude "Extruir38" cut sketch "Boceto30" against normal blind 3 contours A0
sketch "Boceto31" plane through (0, 38, 0) normal (0, 1, 0) x (-1, 0, 0)
  line L0 (-207, -21.907) -> (-220, -21.907)
  line L1 (-220, -21.907) -> (-220, -38.093)
  line L2 (-220, -38.093) -> (-207, -38.093)
  line L3 (-207, -38.093) -> (-207, -21.907)
  line L4 (-207, -38.093) -> (-207, -30)
  circle A0 centre (-213.5, -30) radius 1.6
  dimension "d133" = 3.2
extrude "Extruir39" cut sketch "Boceto31" against normal blind 3 contours A0
extrude "Extruir40" add 1 faces at (102.9399, 38, -24.0728) along direction (0, 1, 0) blind 3
extrude "Extruir41" add 1 faces at (213.5399, 38, -24.0728) along direction (0, 1, 0) blind 3
extrude "Extruir42" add 1 faces at (103.1667, 35, -30.9247) along direction (0, 1, 0) blind 3
extrude "Extruir43" add 1 faces at (213.109, 35, -29.4783) along direction (0, 1, 0) blind 3
extrude "Extruir44" cut 1 faces at (-17.5841, -22, 8.3093) along direction (0, -1, 0) blind 7
extrude "Extruir45" cut 1 faces at (-17.5841, -29, 8.3093) along direction (0, -1, 0) blind 1
extrude "Extruir46" cut 1 faces at (243.5647, -22, -40.3949) along direction (0, -1, 0) blind 8
extrude "Extruir47" cut 1 faces at (-10, 18.6667, -16.6667) along direction (1, 0, 0) blind 10
sketch "Boceto32" plane through (0, 0, 0) normal (-1, 0, 0) x (0, 0, 1)
  line L0 (-67, -30) -> (-67, 40)
  line L1 (-67, 40) -> (7, 40)
  line L2 (7, 40) -> (7, -30)
  line L3 (7, -30) -> (10, -30)
  line L4 (10, -30) -> (10, 43)
  line L5 (10, 43) -> (-70, 43)
  line L6 (-70, 43) -> (-70, -30)
  line L7 (-70, -30) -> (-67, -30)
  line L8 (-70, 43) -> (10, 43)
  line L9 (10, 43) -> (10, -30)
  line L10 (10, -30) -> (-70, -30)
  line L11 (-70, -30) -> (-70, 43)
extrude "Extruir48" add sketch "Boceto32" against normal blind 3 contours L0 L1 L2 L10
extrude "Extruir49" cut 1 faces at (230, 18.6667, -16.6667) along direction (-1, 0, 0) blind 5
sketch "Boceto33" plane through (225, 0, 0) normal (1, 0, 0) x (0, 0, -1)
  line L0 (-7, -30) -> (-7, 40)
  line L1 (-7, 40) -> (6.407, 40)
  line L2 (6.407, 40) -> (6.407, 28.5)
  line L3 (6.407, 28.5) -> (53.593, 28.5)
  line L4 (53.593, 28.5) -> (53.593, 40)
  line L5 (53.593, 40) -> (67, 40)
  line L6 (67, 40) -> (67, -30)
  line L7 (67, -30) -> (70, -30)
  line L8 (70, -30) -> (70, 43)
  line L9 (70, 43) -> (-10, 43)
  line L10 (-10, 43) -> (-10, -30)
  line L11 (-10, -30) -> (-7, -30)
  line L12 (-10, 43) -> (70, 43)
  line L13 (70, 43) -> (70, -30)
  line L14 (70, -30) -> (-10, -30)
  line L15 (-10, -30) -> (-10, 43)
extrude "Extruir50" add sketch "Boceto33" against normal blind 3 contours L0 L1 L2 L3 L4 L5 L6 L14
extrude "Extruir51" cut 1 faces at (0, -5.6667, -16.6667) along direction (1, 0, 0) blind 10
sketch "Boceto34" plane through (10, 0, 0) normal (-1, 0, 0) x (0, 0, 1)
  line L0 (7, 40) -> (7, -30)
  line L1 (7, -30) -> (10, -30)
  line L2 (10, -30) -> (10, 43)
  line L3 (10, 43) -> (-70, 43)
  line L4 (-70, 43) -> (-70, -30)
  line L5 (-70, -30) -> (-67, -30)
  line L6 (-67, -30) -> (-67, 40)
  line L7 (-67, 40) -> (7, 40)
  line L8 (-70, 43) -> (10, 43)
  line L9 (10, 43) -> (10, -30)
  line L10 (10, -30) -> (-70, -30)
  line L11 (-70, -30) -> (-70, 43)
extrude "Extruir52" add sketch "Boceto34" against normal blind 3 contours L0 L6 L7 L10
equation "d46 = 6.8 mm - 3 mm"
equation "d53 = 4.56 mm - 3 mm + 3 mm"
equation "d99 = 20.686 mm - 5.5 mm"
equation "d116 = 21.186 mm - 5 mm"
equation "d119 = 21.186 mm - 5 mm"
equation "d126 = 16.186 * 0.5 mm"
equation "d127 = 13.000 * 0.5 mm"
equation "d136 = 5 mm - 2 mm"
equation "d138 = 5 mm - 2 mm"
equation "d140 = 6 mm - 3 mm"
equation "d142 = 6 mm - 3 mm"
